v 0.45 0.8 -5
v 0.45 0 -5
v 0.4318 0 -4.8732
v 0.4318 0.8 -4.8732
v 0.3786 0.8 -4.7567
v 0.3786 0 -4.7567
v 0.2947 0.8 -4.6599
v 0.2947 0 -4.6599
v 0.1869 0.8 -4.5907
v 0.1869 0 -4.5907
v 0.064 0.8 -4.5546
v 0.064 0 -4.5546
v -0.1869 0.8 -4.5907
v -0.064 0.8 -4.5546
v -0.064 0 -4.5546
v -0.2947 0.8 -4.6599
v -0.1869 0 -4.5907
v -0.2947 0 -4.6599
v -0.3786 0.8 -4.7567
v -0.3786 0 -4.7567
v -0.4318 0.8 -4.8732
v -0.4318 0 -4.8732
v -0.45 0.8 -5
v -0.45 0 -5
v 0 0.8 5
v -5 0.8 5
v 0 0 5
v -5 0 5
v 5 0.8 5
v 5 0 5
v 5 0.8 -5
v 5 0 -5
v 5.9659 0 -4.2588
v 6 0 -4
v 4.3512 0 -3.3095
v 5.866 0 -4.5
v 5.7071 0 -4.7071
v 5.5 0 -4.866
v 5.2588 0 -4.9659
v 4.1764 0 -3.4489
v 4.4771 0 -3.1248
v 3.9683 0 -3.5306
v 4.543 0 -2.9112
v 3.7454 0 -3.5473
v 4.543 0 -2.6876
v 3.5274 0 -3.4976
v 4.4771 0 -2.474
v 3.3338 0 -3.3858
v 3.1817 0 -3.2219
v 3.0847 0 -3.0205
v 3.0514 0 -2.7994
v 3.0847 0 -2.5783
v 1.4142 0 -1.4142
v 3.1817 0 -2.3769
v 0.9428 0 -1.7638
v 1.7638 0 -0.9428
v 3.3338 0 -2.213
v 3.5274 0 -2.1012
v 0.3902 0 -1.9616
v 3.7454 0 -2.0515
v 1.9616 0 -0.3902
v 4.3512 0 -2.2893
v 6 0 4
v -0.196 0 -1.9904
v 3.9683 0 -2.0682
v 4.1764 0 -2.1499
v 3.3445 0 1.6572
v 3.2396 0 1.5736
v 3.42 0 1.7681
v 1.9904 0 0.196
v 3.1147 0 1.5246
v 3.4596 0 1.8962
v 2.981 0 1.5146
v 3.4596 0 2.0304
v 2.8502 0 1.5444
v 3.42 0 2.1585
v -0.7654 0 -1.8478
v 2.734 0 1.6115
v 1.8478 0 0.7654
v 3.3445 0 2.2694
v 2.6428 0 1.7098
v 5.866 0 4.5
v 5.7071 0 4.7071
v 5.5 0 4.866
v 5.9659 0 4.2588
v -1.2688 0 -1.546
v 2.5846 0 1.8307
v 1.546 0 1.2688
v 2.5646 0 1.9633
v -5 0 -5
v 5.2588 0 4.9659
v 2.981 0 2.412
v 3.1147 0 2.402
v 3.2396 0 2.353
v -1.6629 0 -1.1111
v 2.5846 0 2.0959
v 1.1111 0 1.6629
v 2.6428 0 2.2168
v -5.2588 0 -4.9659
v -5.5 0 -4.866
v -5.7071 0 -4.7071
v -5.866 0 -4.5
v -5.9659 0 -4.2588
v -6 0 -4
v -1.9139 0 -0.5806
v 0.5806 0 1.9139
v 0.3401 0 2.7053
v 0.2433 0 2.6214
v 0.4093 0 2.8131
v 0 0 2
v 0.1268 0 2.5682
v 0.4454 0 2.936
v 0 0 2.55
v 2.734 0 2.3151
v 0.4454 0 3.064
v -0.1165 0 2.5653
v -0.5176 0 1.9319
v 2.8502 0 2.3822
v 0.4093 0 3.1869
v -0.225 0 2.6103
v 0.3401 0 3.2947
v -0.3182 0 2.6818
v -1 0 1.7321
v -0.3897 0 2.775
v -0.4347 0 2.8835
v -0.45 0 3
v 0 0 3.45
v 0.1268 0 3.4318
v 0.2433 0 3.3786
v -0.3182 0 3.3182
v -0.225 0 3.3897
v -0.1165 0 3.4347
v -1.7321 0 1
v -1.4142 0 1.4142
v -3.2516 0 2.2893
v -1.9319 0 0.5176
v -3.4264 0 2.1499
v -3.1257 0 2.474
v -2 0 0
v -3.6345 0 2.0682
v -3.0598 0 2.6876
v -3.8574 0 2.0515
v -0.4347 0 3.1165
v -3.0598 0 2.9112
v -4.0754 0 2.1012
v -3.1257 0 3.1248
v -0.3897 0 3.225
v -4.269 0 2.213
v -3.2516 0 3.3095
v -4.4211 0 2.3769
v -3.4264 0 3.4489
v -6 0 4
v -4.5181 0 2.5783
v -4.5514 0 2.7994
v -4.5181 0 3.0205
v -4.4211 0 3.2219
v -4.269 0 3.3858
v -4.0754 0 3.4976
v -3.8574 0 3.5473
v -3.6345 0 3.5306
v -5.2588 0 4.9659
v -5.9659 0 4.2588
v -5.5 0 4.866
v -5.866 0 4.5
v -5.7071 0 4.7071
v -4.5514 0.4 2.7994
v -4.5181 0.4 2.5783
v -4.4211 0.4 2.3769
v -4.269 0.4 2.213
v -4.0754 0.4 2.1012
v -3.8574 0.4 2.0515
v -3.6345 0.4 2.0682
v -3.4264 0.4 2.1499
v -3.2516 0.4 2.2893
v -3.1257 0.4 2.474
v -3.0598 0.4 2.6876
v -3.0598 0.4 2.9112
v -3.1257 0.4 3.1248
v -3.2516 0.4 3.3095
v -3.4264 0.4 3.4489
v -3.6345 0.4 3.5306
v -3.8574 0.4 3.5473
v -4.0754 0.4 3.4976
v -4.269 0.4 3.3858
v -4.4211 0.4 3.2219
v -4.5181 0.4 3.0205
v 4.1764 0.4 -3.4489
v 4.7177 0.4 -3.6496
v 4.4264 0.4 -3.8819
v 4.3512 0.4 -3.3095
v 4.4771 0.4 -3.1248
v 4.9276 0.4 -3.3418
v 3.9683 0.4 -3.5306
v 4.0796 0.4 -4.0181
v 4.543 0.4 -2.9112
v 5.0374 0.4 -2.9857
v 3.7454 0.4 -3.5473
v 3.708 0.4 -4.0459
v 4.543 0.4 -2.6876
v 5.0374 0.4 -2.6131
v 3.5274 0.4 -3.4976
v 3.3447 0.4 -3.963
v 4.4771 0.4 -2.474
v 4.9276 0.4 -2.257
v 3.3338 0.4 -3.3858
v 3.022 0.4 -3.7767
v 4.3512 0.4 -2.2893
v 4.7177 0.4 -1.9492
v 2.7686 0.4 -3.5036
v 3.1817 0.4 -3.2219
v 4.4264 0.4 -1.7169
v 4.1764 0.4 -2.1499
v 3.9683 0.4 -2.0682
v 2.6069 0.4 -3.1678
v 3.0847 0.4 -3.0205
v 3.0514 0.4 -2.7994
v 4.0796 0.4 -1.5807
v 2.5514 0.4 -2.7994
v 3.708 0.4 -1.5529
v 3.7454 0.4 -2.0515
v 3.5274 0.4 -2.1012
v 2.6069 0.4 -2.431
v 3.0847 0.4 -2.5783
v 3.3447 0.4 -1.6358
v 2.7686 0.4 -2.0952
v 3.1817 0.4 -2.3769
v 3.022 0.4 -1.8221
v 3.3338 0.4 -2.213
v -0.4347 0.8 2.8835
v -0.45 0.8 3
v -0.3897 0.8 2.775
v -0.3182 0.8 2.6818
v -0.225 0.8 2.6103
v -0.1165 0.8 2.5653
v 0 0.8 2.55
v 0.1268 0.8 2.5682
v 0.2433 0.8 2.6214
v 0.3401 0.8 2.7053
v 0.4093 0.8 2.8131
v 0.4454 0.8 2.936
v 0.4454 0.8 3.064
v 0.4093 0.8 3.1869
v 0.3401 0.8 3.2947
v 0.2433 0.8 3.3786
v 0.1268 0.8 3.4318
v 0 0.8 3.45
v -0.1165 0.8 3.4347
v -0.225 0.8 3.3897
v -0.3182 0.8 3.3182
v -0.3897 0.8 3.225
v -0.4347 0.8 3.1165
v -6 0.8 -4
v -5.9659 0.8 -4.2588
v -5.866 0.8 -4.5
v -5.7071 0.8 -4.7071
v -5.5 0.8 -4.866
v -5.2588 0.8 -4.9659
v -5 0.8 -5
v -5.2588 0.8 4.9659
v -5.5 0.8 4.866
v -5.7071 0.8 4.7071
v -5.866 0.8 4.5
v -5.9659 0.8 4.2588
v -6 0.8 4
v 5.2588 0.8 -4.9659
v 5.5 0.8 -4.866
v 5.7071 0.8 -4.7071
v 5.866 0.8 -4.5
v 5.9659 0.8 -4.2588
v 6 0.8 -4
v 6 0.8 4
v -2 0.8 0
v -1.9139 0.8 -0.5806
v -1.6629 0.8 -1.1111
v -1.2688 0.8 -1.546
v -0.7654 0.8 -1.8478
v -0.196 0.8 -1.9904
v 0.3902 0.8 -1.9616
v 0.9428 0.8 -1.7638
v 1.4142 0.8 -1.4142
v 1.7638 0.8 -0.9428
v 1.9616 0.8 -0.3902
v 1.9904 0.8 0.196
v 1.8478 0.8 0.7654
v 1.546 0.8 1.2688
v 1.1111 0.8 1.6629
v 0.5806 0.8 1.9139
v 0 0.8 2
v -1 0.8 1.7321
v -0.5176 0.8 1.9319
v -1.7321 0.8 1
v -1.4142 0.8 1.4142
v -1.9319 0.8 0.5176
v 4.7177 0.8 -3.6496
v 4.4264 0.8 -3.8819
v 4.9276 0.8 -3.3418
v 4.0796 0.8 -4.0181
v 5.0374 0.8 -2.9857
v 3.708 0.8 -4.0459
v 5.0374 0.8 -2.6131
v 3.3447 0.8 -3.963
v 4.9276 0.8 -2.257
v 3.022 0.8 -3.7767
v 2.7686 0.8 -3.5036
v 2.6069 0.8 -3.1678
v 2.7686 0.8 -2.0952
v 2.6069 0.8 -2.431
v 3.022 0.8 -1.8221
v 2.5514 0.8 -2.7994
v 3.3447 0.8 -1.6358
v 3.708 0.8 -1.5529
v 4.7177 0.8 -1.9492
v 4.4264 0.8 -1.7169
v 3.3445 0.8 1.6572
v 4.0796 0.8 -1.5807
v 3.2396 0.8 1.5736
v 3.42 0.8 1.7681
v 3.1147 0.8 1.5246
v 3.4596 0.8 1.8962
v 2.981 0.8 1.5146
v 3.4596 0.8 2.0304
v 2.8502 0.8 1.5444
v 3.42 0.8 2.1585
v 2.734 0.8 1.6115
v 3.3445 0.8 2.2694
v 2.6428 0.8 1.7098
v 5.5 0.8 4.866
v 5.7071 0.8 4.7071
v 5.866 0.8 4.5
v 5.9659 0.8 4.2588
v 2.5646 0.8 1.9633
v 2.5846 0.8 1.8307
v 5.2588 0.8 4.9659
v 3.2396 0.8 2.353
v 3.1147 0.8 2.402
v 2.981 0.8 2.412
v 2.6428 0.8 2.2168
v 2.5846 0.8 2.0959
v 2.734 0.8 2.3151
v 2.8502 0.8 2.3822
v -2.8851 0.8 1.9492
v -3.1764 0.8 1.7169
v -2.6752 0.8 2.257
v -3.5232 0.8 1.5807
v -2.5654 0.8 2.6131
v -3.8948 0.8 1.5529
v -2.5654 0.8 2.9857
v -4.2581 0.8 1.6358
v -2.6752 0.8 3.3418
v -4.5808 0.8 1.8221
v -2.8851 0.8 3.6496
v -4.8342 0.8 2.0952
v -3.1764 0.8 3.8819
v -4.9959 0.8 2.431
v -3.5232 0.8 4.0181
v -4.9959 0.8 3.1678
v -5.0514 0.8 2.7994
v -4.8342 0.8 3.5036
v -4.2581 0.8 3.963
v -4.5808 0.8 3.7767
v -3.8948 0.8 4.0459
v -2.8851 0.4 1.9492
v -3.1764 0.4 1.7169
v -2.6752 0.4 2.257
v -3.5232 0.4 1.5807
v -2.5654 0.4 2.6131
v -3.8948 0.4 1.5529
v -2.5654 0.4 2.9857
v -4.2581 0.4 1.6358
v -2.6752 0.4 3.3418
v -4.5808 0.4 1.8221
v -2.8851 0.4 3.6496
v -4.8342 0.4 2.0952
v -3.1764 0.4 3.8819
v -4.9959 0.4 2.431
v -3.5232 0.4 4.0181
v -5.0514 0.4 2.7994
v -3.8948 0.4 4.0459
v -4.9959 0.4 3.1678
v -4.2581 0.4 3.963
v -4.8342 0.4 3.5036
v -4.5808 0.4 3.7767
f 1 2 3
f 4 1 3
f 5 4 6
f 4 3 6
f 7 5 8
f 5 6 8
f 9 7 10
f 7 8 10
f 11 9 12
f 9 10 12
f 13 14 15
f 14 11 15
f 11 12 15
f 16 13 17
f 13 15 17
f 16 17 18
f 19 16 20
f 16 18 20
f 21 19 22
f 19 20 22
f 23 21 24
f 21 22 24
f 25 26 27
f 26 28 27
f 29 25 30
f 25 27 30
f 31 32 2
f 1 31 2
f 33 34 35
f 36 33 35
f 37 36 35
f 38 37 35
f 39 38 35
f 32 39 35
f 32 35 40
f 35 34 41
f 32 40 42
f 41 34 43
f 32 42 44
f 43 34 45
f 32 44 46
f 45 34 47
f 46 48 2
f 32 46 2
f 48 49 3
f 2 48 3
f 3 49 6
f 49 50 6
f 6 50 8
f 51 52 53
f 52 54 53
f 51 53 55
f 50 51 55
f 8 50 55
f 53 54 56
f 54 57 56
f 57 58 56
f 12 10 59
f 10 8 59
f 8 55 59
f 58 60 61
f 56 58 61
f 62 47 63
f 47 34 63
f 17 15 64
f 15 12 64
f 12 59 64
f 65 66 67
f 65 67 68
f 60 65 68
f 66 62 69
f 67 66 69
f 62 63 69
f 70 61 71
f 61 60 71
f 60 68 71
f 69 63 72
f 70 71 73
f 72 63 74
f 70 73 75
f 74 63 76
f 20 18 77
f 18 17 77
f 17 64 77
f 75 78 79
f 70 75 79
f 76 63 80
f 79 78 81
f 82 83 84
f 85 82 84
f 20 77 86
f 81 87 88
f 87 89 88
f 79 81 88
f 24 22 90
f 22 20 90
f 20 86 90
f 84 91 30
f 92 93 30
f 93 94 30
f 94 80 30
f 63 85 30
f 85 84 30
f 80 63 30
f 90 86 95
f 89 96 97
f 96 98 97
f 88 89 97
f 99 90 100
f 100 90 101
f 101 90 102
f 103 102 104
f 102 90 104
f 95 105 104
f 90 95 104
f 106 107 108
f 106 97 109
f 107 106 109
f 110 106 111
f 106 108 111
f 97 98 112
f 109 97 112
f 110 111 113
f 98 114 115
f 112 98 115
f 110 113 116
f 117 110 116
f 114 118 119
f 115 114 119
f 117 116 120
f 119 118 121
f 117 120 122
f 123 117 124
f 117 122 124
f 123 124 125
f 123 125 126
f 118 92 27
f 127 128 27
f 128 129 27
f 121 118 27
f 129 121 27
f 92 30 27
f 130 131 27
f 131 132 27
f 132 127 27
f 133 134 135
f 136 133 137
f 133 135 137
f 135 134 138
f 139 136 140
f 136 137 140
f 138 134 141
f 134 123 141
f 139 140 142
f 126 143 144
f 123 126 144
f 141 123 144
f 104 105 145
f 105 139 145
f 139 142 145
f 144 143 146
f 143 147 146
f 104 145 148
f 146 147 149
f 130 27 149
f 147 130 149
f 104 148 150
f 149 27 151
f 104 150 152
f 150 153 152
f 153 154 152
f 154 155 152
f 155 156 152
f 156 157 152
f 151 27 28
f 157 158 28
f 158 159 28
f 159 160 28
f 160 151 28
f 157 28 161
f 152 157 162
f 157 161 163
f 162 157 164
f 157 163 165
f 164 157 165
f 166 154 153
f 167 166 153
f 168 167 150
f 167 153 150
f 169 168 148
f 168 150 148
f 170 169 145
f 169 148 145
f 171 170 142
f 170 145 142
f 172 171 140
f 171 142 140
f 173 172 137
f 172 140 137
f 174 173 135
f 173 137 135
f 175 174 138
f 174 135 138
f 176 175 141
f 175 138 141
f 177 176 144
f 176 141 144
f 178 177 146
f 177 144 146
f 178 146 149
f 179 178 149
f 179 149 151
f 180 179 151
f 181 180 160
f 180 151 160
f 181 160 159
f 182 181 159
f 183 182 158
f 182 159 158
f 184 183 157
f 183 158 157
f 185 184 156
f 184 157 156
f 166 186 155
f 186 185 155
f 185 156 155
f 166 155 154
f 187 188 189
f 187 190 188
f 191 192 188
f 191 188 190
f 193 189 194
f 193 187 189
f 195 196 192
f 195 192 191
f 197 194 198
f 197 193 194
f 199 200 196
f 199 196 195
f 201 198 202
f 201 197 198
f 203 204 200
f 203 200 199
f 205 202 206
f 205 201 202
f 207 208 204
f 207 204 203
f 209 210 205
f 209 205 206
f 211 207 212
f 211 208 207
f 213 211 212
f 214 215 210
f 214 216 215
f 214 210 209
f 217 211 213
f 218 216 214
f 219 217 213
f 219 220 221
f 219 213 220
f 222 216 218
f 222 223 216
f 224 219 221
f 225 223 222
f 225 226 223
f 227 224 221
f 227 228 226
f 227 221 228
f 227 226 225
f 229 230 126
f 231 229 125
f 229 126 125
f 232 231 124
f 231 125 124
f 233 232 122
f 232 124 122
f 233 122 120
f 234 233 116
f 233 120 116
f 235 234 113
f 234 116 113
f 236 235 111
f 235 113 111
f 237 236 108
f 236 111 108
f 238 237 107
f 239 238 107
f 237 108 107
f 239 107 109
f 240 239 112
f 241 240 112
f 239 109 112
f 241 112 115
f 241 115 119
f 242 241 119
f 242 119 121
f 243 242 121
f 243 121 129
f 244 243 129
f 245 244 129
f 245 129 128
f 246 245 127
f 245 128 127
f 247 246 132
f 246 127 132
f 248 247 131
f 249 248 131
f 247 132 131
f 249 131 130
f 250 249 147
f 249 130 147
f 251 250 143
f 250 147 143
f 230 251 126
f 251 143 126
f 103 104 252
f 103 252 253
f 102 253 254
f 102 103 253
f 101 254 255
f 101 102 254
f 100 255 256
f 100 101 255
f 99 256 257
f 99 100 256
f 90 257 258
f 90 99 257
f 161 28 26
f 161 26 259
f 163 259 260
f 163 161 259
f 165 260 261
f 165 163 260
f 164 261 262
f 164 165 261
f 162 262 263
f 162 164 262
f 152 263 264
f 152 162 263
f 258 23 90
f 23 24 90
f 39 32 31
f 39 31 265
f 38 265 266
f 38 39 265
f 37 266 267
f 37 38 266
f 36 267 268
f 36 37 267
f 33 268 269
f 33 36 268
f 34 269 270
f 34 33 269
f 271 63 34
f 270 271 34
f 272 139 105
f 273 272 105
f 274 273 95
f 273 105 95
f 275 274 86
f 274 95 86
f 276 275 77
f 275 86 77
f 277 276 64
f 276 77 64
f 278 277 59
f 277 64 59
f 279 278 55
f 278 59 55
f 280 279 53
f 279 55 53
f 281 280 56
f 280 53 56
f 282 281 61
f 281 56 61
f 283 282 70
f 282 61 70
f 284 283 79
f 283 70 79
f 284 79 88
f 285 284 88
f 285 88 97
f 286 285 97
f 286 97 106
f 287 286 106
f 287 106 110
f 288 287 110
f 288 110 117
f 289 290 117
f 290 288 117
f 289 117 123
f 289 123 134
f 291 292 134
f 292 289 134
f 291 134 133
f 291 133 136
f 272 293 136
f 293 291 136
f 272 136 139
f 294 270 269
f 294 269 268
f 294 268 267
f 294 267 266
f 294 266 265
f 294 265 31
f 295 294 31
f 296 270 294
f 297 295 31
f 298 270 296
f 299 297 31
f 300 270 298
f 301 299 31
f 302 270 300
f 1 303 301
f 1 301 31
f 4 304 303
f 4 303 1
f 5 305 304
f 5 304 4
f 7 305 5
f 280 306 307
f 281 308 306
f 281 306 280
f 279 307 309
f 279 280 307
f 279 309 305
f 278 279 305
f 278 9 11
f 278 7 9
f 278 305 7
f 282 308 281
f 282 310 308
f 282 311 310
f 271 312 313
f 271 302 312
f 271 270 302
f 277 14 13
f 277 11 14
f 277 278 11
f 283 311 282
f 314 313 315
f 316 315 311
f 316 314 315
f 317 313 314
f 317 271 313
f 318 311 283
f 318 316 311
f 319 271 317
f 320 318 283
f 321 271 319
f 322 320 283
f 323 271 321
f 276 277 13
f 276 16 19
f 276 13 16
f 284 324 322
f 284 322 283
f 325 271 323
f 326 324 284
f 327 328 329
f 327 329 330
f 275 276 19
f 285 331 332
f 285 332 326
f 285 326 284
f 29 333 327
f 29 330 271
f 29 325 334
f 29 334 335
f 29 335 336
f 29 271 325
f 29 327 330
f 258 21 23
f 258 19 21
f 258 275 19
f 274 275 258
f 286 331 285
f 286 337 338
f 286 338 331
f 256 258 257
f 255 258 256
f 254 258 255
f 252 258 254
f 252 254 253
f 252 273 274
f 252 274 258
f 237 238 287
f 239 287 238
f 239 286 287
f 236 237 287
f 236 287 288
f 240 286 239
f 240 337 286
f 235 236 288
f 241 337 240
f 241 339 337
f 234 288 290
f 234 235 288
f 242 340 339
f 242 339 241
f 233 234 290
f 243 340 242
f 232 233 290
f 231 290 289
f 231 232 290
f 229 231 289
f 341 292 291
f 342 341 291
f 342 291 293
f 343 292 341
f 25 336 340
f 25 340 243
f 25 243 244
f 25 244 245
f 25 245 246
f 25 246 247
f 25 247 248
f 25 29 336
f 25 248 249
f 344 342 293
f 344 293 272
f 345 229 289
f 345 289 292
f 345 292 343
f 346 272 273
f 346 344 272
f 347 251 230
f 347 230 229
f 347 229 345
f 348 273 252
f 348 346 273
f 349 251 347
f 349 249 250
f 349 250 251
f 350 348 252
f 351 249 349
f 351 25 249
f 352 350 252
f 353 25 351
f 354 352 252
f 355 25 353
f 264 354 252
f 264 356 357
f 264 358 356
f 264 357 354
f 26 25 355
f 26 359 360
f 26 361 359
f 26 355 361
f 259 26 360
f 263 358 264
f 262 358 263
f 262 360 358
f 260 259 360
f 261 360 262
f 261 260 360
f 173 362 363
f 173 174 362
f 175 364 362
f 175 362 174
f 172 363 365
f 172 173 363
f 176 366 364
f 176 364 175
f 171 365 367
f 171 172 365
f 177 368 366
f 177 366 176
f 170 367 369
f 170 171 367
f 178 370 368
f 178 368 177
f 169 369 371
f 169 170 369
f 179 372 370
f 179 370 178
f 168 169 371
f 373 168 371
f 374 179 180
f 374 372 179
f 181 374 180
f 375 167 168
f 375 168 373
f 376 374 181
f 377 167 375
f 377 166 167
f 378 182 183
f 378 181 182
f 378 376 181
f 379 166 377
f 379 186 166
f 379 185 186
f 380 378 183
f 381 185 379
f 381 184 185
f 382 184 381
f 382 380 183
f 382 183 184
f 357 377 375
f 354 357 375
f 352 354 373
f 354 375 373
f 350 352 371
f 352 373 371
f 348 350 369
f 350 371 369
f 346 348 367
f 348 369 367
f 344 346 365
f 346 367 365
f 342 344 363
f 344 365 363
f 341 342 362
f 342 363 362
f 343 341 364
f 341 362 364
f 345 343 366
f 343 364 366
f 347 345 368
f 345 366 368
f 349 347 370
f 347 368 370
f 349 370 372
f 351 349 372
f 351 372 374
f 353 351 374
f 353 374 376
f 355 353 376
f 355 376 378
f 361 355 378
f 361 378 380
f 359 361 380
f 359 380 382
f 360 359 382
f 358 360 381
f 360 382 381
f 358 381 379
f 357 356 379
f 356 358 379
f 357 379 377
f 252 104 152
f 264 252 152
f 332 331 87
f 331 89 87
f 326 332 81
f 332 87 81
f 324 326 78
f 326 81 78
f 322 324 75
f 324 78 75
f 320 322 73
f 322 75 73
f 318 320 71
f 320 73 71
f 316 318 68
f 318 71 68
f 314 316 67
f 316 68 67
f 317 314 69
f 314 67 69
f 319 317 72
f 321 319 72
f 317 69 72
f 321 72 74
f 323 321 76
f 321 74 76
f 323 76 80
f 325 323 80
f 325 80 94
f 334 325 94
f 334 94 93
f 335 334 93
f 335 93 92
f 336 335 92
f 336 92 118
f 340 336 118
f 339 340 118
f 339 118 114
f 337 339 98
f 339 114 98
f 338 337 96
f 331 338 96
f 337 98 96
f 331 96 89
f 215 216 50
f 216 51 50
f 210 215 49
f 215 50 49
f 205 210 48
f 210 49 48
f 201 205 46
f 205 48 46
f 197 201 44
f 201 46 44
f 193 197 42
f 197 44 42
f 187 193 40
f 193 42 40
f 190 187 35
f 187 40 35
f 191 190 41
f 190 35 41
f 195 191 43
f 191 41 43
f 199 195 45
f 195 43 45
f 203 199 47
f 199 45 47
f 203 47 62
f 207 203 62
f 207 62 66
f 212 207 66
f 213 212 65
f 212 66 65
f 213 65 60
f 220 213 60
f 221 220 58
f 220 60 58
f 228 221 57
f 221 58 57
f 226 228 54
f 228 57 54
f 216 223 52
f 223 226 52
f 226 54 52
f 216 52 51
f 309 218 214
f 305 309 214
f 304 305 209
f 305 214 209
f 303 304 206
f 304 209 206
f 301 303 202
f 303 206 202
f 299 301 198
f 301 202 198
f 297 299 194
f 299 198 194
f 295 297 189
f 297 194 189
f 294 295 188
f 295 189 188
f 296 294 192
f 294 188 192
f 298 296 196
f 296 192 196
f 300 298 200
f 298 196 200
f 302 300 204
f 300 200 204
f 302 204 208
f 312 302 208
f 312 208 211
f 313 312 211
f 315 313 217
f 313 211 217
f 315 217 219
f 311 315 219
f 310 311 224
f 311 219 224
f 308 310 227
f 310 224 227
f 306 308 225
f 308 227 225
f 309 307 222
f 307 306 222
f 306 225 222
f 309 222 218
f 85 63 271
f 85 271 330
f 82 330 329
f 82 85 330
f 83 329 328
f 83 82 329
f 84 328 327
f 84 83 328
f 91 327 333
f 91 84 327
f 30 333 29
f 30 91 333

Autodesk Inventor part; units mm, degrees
ref_plane "YZ Plane" through (0, 0, 0) normal (1, 0, 0) x (0, 1, 0)
ref_plane "XZ Plane" through (0, 0, 0) normal (0, 1, 0) x (-1, 0, 0)
ref_plane "XY Plane" through (0, 0, 0) normal (0, 0, 1) x (1, 0, 0)
sketch "Esboço2" plane through (0, 0, 0) normal (0, 1, 0) x (-1, 0, 0)
  circle A0 centre (3.8014, 2.7994) radius 1.25
  circle A1 centre (-3.8014, -2.7994) radius 1.25
  arc A2 (-5, 5) -> (-6, 4) centre (-5, 4) ccw
  line L0 (-6, 4) -> (-6, -4)
  arc A3 (-6, -4) -> (-5, -5) centre (-5, -4) ccw
  line L1 (-5, -5) -> (5, -5)
  arc A4 (5, -5) -> (6, -4) centre (5, -4) ccw
  line L2 (6, -4) -> (6, 4)
  arc A5 (6, 4) -> (5, 5) centre (5, 4) ccw
  line L3 (5, 5) -> (-5, 5)
  circle A6 centre (0, 0) radius 2
  arc A7 (0.45, -5) -> (-0.45, -5) centre (0, -5) ccw
  circle A8 centre (3.8014, 2.7994) radius 0.75
  circle A9 centre (-3.8014, -2.7994) radius 0.75
  circle A10 centre (-3.0146, 1.9633) radius 0.45
  circle A11 centre (0, 3) radius 0.45
  line L4 (0, 0) -> (0, 5)
  dimension "d16" = 0.9
  dimension "d17" = 1.5
  dimension "d18" = 1.5
  dimension "d23" = 4
  dimension "d26" = 2
  dimension "d27" = 0
extrude "Extrusão3" add sketch "Esboço2" along normal blind 0.8 contours A11 L4 | L4 A11 | L3 A5 L2 A4 L1 A7 A3 L0 A2 | A10
extrude "Extrusão4" add sketch "Esboço2" along normal blind 0.4 contours A0 | A1
extrude "Extrusão5" cut sketch "Esboço2" along normal blind 10 contours A10
extrude "Extrusão6" cut sketch "Esboço2" along normal blind 10 contours A11 L4 | L4 A11
sketch "Esboço4" plane through (0, 0.8, 0) normal (0, 1, 0) x (1, 0, 0)
  point P0 (0, 0)
properties part number "Chapa Inferior"
